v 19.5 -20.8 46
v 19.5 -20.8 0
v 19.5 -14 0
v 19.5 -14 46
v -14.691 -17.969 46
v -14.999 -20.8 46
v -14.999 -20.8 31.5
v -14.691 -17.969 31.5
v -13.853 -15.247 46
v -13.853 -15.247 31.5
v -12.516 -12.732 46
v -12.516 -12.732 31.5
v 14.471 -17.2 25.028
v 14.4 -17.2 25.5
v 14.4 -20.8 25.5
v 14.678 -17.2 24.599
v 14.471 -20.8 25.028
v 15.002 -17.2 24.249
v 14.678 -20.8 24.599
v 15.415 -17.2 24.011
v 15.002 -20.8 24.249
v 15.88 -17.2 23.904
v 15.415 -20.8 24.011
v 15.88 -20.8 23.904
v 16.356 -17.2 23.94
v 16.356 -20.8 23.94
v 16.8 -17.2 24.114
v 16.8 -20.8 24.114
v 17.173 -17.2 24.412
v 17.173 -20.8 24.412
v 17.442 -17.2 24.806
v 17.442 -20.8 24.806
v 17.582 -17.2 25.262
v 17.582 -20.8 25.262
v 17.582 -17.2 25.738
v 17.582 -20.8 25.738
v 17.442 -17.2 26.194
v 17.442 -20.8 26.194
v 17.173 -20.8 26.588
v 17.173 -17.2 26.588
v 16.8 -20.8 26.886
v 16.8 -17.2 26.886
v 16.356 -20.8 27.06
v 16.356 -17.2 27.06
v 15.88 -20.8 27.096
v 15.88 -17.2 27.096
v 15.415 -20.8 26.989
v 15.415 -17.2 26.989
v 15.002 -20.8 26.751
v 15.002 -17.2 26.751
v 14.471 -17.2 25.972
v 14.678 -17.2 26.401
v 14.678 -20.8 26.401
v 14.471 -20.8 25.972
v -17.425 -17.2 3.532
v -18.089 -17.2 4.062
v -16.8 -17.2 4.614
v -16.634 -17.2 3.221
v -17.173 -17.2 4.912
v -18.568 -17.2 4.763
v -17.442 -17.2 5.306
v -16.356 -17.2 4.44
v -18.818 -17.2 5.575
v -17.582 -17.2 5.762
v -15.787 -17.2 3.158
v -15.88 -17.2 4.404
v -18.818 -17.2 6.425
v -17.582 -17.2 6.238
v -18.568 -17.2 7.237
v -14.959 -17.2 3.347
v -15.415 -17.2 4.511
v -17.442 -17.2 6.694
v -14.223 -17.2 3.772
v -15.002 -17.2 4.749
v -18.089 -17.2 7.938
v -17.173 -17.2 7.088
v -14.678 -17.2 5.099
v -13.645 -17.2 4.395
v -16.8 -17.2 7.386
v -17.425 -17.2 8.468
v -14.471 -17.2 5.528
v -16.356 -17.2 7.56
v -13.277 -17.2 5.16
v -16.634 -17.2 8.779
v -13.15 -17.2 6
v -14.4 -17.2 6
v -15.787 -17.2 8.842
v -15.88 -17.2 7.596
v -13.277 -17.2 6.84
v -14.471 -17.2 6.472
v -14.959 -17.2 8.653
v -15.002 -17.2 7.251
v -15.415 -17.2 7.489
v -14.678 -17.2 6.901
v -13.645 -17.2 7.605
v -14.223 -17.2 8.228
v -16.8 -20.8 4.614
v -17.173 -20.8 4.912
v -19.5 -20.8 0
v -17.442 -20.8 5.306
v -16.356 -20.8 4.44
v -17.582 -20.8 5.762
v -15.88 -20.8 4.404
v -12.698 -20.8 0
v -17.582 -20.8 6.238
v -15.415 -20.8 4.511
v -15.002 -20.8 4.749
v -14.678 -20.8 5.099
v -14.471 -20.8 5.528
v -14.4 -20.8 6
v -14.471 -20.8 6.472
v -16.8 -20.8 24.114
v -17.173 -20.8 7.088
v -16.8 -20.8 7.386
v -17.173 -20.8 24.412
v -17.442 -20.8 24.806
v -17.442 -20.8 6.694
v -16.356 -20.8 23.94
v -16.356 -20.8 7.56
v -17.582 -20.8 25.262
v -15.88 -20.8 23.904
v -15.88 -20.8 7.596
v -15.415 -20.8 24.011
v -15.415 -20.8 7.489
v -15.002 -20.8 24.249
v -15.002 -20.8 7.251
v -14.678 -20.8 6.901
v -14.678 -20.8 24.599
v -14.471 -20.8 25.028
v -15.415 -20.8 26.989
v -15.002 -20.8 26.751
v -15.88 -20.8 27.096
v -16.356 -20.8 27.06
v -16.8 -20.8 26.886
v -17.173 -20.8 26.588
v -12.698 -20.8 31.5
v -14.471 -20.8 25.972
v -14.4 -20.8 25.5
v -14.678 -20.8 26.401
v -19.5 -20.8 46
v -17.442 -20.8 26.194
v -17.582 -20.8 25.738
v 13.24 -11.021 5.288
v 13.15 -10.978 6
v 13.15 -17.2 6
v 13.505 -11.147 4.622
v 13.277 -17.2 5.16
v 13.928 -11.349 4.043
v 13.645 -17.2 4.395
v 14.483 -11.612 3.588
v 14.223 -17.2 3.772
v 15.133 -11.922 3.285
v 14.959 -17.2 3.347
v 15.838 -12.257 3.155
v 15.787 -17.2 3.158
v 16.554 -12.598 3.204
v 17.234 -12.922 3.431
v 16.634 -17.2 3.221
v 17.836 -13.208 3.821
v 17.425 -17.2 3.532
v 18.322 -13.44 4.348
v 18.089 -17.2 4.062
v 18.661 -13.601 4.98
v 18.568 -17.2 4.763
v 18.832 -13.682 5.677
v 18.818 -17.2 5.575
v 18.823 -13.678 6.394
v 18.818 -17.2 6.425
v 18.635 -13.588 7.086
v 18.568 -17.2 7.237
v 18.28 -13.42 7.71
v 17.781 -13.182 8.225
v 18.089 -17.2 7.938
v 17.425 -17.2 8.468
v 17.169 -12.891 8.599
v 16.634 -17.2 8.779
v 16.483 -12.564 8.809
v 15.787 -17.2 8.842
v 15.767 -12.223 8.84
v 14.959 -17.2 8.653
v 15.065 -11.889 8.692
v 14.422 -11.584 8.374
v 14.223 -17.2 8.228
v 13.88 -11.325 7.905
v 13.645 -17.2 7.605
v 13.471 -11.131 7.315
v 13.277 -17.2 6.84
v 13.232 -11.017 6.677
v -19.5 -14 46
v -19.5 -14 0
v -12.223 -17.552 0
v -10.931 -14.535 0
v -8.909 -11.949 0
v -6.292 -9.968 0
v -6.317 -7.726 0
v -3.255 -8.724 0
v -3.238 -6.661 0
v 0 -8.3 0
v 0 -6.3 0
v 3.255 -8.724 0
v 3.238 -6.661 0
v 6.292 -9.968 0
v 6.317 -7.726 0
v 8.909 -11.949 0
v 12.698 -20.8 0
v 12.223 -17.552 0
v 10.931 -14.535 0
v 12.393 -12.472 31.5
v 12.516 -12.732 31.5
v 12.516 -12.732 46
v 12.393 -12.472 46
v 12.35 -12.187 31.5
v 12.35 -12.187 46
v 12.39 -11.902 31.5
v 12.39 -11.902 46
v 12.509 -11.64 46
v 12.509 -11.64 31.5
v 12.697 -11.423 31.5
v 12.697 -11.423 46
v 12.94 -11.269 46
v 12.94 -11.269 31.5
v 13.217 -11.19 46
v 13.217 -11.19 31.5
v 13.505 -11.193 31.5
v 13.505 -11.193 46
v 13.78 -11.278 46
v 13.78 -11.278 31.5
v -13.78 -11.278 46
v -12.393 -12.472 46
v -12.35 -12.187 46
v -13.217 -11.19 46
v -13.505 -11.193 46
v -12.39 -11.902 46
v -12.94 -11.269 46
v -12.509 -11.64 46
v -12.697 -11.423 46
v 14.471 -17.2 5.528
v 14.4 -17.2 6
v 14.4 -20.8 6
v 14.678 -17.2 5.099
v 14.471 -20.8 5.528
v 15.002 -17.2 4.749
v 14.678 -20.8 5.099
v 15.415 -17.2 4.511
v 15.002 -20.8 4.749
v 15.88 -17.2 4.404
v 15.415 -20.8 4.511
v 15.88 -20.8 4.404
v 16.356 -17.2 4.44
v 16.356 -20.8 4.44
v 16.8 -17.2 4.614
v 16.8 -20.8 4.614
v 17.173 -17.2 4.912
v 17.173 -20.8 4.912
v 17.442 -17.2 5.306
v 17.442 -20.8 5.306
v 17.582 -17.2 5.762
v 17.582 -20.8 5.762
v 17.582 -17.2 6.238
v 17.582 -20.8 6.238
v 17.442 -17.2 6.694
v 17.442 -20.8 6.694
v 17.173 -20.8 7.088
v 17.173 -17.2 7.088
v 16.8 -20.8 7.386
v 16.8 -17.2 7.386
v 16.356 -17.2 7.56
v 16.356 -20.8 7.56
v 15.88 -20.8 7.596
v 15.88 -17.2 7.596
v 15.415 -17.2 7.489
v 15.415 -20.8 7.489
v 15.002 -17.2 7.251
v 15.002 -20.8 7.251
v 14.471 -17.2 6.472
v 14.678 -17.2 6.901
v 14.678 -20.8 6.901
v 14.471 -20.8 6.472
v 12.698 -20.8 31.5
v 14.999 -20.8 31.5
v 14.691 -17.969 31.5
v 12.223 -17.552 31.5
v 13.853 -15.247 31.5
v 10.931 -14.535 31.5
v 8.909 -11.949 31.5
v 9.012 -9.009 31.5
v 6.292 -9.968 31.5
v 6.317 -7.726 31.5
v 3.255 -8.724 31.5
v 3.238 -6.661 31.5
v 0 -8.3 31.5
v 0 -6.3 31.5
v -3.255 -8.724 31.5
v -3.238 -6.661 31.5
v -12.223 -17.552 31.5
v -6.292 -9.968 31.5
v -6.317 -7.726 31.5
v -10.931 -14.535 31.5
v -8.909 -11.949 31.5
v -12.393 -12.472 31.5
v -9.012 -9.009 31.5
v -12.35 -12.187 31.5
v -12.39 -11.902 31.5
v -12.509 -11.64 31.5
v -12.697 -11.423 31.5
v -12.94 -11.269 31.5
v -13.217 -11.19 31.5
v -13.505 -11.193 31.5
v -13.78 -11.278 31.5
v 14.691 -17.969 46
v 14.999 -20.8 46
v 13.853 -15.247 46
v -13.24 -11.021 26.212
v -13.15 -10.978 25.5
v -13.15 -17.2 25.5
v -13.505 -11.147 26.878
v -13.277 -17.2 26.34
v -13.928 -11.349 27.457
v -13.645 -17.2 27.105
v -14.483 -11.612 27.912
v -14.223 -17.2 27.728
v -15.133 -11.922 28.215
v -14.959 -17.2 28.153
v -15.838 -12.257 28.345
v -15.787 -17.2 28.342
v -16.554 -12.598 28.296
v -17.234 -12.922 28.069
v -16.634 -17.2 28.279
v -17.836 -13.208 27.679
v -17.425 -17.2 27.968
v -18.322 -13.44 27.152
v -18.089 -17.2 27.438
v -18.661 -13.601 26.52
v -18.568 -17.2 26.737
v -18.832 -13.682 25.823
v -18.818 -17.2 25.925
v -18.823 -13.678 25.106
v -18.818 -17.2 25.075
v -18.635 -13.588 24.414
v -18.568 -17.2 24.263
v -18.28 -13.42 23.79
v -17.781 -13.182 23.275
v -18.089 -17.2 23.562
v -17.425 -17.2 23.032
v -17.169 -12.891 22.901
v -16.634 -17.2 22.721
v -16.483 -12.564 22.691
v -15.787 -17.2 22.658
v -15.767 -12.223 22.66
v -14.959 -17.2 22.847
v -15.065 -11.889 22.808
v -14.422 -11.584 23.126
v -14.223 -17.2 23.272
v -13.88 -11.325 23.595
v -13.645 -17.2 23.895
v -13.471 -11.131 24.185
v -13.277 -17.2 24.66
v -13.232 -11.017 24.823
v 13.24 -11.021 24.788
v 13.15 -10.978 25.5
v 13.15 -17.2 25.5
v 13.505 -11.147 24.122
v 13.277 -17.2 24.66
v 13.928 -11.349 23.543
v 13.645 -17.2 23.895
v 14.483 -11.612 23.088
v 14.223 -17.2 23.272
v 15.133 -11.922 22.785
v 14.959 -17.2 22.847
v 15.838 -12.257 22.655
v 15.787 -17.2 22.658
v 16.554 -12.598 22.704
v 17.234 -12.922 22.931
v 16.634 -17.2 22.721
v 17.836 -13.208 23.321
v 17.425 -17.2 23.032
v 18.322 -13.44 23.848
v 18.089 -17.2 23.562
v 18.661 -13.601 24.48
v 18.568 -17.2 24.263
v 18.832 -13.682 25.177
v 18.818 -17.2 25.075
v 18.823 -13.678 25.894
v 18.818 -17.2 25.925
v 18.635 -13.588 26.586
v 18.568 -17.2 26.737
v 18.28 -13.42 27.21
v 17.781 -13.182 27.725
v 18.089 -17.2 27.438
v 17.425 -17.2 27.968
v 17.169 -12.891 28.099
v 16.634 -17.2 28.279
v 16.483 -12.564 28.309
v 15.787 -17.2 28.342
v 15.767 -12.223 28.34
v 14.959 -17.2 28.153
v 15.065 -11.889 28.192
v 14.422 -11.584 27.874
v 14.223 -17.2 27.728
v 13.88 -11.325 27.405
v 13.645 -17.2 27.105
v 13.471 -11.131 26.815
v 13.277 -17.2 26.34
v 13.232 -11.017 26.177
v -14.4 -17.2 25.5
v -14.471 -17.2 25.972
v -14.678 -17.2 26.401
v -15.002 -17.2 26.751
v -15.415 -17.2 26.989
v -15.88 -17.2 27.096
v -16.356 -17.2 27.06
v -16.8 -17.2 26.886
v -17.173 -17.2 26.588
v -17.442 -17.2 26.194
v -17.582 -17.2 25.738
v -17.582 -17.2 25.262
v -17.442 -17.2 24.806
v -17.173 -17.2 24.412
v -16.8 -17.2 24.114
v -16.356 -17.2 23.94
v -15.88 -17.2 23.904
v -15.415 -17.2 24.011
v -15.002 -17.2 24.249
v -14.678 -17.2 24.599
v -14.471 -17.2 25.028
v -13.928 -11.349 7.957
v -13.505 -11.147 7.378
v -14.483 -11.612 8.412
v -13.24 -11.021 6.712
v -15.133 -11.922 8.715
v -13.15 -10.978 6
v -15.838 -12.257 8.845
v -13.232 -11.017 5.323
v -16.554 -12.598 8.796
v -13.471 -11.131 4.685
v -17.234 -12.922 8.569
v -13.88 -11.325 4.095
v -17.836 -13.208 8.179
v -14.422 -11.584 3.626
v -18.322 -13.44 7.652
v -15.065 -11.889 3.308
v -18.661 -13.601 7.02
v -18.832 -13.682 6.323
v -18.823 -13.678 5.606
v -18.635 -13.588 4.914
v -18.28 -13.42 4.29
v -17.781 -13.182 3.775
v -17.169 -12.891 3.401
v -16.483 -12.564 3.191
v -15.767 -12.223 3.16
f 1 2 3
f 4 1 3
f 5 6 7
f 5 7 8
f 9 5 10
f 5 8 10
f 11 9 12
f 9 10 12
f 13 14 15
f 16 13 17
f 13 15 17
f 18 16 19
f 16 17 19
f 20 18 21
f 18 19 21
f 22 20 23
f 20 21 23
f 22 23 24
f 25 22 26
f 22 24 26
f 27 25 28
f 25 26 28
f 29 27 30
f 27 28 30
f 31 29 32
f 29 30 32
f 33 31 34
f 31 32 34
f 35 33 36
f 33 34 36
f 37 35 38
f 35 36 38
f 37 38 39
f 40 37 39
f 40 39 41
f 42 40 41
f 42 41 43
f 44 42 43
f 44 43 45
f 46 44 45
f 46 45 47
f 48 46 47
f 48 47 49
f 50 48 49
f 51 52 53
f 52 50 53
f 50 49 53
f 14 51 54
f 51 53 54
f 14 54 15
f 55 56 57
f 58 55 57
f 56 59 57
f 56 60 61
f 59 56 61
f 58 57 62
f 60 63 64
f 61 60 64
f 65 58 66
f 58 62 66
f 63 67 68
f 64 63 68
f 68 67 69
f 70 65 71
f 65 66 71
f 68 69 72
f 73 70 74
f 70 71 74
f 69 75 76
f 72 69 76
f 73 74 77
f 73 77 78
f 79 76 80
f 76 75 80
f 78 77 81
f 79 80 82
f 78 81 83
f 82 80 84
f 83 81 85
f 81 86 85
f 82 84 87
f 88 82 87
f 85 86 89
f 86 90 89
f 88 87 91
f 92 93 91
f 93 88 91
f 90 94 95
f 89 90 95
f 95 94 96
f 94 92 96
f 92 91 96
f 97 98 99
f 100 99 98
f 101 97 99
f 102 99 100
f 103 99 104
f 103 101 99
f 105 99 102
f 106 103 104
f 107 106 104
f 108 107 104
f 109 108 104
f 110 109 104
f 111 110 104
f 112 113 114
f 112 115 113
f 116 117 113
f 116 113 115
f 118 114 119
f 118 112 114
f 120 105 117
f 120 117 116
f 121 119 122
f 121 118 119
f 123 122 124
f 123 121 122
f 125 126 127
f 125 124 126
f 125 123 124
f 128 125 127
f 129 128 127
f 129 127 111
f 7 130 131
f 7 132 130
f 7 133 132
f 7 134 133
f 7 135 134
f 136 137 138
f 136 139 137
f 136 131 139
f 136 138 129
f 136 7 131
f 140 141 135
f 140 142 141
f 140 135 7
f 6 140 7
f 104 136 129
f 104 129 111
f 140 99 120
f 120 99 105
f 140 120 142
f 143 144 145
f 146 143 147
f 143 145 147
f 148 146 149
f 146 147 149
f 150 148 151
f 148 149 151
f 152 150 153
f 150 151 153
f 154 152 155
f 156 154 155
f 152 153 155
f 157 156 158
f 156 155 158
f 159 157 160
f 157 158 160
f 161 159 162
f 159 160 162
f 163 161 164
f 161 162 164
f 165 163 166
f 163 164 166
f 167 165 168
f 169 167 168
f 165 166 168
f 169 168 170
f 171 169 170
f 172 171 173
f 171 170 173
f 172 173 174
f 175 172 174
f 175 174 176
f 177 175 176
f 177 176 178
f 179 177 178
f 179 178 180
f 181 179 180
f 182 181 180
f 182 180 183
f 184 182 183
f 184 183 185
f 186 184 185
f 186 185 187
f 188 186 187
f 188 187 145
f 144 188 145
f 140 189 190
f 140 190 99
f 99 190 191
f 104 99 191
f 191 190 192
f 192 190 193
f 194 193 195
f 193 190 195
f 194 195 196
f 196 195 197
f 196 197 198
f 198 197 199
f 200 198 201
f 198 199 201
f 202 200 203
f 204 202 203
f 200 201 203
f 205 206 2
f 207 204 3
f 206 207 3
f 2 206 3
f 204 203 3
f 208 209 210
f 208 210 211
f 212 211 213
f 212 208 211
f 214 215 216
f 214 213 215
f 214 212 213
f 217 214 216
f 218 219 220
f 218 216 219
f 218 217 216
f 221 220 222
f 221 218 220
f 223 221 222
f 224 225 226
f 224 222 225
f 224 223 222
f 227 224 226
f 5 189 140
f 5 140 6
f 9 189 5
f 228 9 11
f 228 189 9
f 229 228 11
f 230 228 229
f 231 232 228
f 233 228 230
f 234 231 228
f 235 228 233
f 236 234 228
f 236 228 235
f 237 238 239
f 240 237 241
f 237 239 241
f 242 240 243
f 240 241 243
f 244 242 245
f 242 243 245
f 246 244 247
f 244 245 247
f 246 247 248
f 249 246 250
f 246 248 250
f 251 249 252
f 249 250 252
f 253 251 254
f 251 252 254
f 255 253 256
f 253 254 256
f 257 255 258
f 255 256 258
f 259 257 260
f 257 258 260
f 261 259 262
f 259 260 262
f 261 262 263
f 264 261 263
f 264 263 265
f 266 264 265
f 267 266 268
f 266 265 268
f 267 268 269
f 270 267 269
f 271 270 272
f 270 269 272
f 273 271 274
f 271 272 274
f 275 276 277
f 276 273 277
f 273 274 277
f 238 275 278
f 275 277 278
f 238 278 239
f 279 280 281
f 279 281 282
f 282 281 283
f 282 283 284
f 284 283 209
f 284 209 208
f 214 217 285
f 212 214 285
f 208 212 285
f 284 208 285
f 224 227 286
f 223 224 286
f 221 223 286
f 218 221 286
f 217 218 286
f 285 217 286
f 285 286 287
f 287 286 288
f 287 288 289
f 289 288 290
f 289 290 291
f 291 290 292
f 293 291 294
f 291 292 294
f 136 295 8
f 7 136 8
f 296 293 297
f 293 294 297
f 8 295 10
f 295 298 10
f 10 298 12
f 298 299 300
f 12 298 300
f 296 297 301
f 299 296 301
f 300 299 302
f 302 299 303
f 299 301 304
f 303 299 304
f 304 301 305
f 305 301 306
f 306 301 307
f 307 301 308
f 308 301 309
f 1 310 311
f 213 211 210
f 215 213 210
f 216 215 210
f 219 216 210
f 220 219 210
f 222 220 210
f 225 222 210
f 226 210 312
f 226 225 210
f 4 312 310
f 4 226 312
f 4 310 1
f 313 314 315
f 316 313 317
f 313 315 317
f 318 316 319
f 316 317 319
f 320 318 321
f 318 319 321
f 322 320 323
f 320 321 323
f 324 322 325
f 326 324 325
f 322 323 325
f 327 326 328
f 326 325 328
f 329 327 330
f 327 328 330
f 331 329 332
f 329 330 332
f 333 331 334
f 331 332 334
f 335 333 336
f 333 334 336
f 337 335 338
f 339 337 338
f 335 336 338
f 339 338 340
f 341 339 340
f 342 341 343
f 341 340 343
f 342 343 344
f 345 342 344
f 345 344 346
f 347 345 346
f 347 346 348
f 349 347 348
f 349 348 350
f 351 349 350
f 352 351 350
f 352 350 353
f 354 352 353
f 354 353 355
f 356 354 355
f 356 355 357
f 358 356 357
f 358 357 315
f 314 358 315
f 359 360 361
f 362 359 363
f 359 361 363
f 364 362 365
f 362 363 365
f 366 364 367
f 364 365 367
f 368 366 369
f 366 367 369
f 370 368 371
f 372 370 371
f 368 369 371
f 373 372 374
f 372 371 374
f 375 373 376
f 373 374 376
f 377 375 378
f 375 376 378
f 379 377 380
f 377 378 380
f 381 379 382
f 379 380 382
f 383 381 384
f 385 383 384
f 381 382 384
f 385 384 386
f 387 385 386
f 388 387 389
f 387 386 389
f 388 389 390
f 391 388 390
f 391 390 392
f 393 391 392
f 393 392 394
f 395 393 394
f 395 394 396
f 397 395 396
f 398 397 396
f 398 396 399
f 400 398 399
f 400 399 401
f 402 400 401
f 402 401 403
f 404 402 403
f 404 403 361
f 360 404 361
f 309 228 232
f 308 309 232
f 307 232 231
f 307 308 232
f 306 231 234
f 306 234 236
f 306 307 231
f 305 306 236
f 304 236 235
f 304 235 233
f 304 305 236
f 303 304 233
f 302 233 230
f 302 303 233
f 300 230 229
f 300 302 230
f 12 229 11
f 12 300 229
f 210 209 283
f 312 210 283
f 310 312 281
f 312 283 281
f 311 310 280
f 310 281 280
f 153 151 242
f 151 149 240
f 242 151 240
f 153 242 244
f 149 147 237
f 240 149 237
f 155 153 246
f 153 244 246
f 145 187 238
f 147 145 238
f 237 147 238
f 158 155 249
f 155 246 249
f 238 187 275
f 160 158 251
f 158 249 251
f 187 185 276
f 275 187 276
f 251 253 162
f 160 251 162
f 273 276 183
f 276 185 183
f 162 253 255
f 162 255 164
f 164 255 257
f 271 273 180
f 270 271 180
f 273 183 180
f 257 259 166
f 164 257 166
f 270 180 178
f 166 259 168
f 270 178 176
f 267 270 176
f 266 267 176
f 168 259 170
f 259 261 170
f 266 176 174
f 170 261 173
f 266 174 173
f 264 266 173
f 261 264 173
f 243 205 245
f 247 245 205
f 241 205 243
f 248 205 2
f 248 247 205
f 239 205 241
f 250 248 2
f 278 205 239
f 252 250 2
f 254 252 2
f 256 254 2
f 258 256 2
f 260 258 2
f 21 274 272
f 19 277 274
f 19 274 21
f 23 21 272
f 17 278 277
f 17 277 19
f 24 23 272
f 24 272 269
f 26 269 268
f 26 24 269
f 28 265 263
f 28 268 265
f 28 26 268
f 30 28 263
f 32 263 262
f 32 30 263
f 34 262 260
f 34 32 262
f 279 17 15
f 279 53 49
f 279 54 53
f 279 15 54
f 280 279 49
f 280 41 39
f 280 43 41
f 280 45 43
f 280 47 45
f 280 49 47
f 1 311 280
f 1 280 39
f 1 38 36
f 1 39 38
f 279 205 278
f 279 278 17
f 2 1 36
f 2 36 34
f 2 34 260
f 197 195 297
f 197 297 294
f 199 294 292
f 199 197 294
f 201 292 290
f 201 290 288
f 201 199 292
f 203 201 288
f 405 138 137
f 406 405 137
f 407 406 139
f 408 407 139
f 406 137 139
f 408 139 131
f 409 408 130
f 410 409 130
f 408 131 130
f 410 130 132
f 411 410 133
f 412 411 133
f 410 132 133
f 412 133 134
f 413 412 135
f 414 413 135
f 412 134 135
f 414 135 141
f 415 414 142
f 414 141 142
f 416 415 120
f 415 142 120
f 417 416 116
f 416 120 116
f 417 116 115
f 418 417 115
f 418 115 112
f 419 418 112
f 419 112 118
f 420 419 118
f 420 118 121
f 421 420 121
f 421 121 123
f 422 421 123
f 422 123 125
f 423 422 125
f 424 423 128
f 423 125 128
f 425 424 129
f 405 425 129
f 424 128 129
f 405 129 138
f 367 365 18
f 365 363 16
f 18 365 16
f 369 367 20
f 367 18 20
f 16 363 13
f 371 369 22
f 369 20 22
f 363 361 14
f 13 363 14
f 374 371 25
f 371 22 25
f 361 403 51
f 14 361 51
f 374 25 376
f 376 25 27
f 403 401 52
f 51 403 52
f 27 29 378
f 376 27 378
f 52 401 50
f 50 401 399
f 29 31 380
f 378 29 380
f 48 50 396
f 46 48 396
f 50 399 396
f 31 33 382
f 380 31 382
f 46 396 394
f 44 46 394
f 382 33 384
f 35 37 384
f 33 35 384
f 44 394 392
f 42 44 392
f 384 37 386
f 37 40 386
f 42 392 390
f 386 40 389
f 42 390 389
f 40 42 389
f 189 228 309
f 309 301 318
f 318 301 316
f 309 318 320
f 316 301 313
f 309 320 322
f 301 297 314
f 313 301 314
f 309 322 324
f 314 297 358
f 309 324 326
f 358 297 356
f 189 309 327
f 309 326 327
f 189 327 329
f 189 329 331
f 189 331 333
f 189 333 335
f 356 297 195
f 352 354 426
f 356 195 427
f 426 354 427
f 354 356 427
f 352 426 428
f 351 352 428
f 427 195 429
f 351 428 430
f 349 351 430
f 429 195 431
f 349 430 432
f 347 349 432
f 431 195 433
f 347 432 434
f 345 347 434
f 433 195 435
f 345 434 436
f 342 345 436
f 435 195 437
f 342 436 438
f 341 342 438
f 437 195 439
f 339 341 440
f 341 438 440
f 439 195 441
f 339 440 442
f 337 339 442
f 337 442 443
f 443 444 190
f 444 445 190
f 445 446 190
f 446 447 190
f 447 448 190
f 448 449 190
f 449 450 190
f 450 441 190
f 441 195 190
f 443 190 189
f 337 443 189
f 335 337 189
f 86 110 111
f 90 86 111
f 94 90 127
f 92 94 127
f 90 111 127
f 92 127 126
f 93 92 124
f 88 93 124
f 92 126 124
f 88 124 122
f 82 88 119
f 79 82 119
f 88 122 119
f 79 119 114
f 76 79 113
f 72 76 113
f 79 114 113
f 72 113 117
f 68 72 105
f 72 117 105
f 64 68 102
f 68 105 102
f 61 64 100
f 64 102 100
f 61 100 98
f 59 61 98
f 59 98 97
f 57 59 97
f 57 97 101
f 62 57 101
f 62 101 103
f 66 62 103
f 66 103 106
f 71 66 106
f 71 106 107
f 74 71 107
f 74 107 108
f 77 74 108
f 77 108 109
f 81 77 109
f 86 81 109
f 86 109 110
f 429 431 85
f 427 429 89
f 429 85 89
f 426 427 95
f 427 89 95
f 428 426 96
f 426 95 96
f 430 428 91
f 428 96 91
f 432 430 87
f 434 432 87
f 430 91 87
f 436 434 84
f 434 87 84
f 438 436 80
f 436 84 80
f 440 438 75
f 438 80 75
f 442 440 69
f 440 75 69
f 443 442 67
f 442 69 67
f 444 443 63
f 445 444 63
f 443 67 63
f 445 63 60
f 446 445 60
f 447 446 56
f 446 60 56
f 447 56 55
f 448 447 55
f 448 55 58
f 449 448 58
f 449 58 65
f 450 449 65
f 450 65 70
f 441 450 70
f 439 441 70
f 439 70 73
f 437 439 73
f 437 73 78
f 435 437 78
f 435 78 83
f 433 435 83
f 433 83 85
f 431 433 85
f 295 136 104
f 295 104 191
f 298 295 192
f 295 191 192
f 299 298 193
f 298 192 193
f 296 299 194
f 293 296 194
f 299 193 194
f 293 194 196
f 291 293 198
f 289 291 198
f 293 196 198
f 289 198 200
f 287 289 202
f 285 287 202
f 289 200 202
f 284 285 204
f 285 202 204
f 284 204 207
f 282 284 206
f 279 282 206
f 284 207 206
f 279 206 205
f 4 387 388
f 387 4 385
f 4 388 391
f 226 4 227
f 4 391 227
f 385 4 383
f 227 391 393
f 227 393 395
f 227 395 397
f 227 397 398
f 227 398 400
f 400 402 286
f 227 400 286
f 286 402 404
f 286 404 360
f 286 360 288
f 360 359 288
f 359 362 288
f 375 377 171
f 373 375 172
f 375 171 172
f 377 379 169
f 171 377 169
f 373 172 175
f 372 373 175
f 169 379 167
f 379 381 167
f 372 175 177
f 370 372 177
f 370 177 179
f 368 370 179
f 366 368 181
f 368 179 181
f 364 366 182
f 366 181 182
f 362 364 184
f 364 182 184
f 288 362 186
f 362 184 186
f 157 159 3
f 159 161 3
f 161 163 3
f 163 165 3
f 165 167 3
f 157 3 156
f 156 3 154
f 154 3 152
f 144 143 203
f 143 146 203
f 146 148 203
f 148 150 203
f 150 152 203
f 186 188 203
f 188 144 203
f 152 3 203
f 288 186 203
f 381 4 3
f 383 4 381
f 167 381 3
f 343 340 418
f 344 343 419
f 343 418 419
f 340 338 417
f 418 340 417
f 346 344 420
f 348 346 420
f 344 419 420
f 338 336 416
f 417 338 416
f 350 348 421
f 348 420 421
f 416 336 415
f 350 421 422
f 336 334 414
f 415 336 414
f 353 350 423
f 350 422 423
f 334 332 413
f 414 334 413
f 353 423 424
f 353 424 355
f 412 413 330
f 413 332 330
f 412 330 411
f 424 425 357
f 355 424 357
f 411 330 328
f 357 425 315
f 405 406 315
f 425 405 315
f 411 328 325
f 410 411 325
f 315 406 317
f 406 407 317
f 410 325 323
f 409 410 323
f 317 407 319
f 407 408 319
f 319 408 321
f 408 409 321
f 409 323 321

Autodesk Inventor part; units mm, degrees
ref_plane "YZ Plane" through (0, 0, 0) normal (1, 0, 0) x (0, 1, 0)
ref_plane "XZ Plane" through (0, 0, 0) normal (0, 1, 0) x (-1, 0, 0)
ref_plane "XY Plane" through (0, 0, 0) normal (0, 0, 1) x (1, 0, 0)
sketch "スケッチ1" plane through (0, 0, 0) normal (0, 0, 1) x (1, 0, 0)
  line L0 (-12.5, 3.2) -> (-11.75, 0)
  line L1 (-11.75, 0) -> (11.75, 0)
  line L2 (11.75, 0) -> (12.5, 3.2)
  line L3 (12.5, 3.2) -> (19.5, 3.2)
  line L4 (19.5, 3.2) -> (19.5, -4)
  line L5 (19.5, -4) -> (-19.5, -4)
  line L6 (-19.5, -4) -> (-19.5, 3.2)
  line L7 (-19.5, 3.2) -> (-12.5, 3.2)
  circle A0 centre (0, -21) radius 12.7 construction
  line L8 (-5.5, -4) -> (5.5, -4) construction
  line L9 (5.5, -4) -> (5.5, -7.5) construction
  line L10 (5.5, -7.5) -> (-5.5, -7.5) construction
  line L11 (-5.5, -7.5) -> (-5.5, -4) construction
  circle A1 centre (0, -21) radius 14.7 construction
  line L12 (-19.5, -21) -> (19.5, -21) construction
  line L13 (-18.75, -24.8) -> (-13.25, -24.8) construction
  line L14 (-13.25, -24.8) -> (-13.25, -27.8) construction
  line L15 (-13.25, -27.8) -> (-18.75, -27.8) construction
  line L16 (-18.75, -27.8) -> (-18.75, -24.8) construction
  line L17 (-16, -27.8) -> (-16, -14.8) construction
  line L18 (-18.75, -14.8) -> (-13.25, -14.8) construction
  line L19 (-13.25, -14.8) -> (-13.25, -17.2) construction
  line L20 (-13.25, -17.2) -> (-18.75, -17.2) construction
  line L21 (-18.75, -17.2) -> (-18.75, -14.8) construction
  line L22 (-14.5, -14.8) -> (-14.5, -27.8) construction
  line L23 (-17.5, -14.8) -> (-17.5, -27.8) construction
  point P0 (0, 0)
  point P1 (0, 0)
  point P2 (0, -4)
  dimension "d0" = 4
  dimension "d1" = 3.2
  dimension "d2" = 23.5
  dimension "d3" = 25
  dimension "d4" = 39
  dimension "d5" = 25.4
  dimension "d6" = 3.5
  dimension "d7" = 21
  dimension "d8" = 11
  dimension "d9" = 2
  dimension "d11" = 5.5
  dimension "d12" = 3
  dimension "d13" = 5.5
  dimension "d14" = 2.4
  dimension "d15" = 10
  dimension "d16" = 1.5
  dimension "d17" = 1.5
  dimension "d18" = 3.8
  dimension "d19" = 16
extrude "押し出し1" add sketch "スケッチ1" along normal blind 46
sketch "スケッチ2" plane through (0, 0, 0) normal (0, 0, -1) x (-1, 0, 0)
  line L0 (19.5, -4) -> (-19.5, -4) projected
  circle A0 centre (0, -21) radius 12.7 projected
  line L1 (19.5, -21) -> (-19.5, -21) projected
  line L2 (-19.5, -21) -> (-19.5, -4)
  line L3 (19.5, -4) -> (19.5, -21)
  point P0 (0, 0)
  point P1 (-12.7, -21)
  point P2 (12.7, -21)
extrude "押し出し2" add sketch "スケッチ2" against normal blind 31.5 contours L3 L1 A0 L2 L0
sketch "スケッチ3" plane through (0, 0, 31.5) normal (0, 0, 1) x (1, 0, 0)
  line L0 (-19.5, -4) -> (19.5, -4) projected
  line L1 (-19.5, -4) -> (-19.5, -21) projected
  line L2 (-19.5, -21) -> (-12.7, -21) projected
  arc A0 (12.7, -21) -> (-12.7, -21) centre (0, -21) ccw projected
  line L3 (12.7, -21) -> (19.5, -21) projected
  line L4 (19.5, -21) -> (19.5, -4) projected
  circle A1 centre (0, -21) radius 15
  point P0 (0, 0)
  point P1 (-15, -21)
  point P2 (15, -21)
  dimension "d24" = 30
extrude "押し出し3" add sketch "スケッチ3" along normal up to surface (14.5 mm away) contours L0 L4 L3 A1 L2 L1
sketch "スケッチ7" plane through (-19.5, -21, 0) normal (0, -1, 0) x (1, 0, 0)
  line L0 (6.8, 0) -> (0, 0) construction
  line L1 (6.8, 0) -> (6.8, 31.5) construction
  line L2 (4.5, 31.5) -> (6.8, 31.5) construction
  line L3 (4.5, 31.5) -> (4.5, 46) construction
  line L4 (4.5, 46) -> (0, 46) construction
  line L5 (0, 0) -> (0, 46) construction
  line L6 (3.5, 0) -> (3.5, 31.5) construction
  circle A0 centre (3.5, 6) radius 2.85
  circle A1 centre (3.5, 25.5) radius 2.85
  point P0 (19.5, 0)
  dimension "d34" = 16
  dimension "d35" = 5.7
  dimension "d36" = 6
  dimension "d37" = 6
extrude "押し出し6" cut sketch "スケッチ7" against normal through all
sketch "スケッチ9" plane through (-19.5, -21, 0) normal (0, -1, 0) x (1, 0, 0)
  circle A0 centre (3.5, 25.5) radius 2.85 projected
  circle A1 centre (3.5, 6) radius 2.85 projected
  circle A2 centre (3.5, 25.5) radius 1.6
  circle A3 centre (3.5, 6) radius 1.6
  point P0 (19.5, 0)
  dimension "d43" = 3.2
extrude "押し出し8" add sketch "スケッチ9" against normal blind 3.8
mirror "ミラー2" about plane through (0, 0, 0) normal (1, 0, 0) of "押し出し6", "押し出し8"
sketch "スケッチ10" plane through (0, 0, 0) normal (0, 0, -1) x (-1, 0, 0)
  circle A0 centre (0, -21) radius 14.7 projected
  line L0 (-19.5, -21) -> (-12.7, -21) projected
  line L1 (12.7, -21) -> (19.5, -21) projected
  line L2 (-19.5, 3.2) -> (-19.5, -21) projected
  line L3 (19.5, 3.2) -> (19.5, -21) projected
  line L4 (-19.5, -14) -> (-6.3166, -7.7263)
  line L5 (6.3166, -7.7263) -> (19.5, -14)
  arc A1 (12.7, -21) -> (-12.7, -21) centre (0, -21) ccw projected
  line L6 (-19.5, 3.2) -> (-12.5, 3.2) projected
  line L7 (-12.5, 3.2) -> (-11.75, 0) projected
  line L8 (-11.75, 0) -> (11.75, 0) projected
  line L9 (11.75, 0) -> (12.5, 3.2) projected
  line L10 (12.5, 3.2) -> (19.5, 3.2) projected
  point P0 (0, 0)
  dimension "d46" = 7
extrude "押し出し9" cut sketch "スケッチ10" against normal through all contours A0 L4 L2 L6 L7 L8 L9 L10 L3 L5
sketch "スケッチ11" plane through (-19.5, -21, 0) normal (0, -1, 0) x (1, 0, 0)
  line L0 (-33.1912, 72.2952) -> (57.3732, 72.2952)
  line L1 (57.3732, 72.2952) -> (57.3732, -15.6553)
  line L2 (57.3732, -15.6553) -> (-33.1912, -15.6553)
  line L3 (-33.1912, -15.6553) -> (-33.1912, 72.2952)
  point P0 (19.5, 0)
extrude "押し出し10" cut sketch "スケッチ11" against normal blind 0.2
fillet "フィレット1" radius 1 2 edges at (-9.012, -9.009, 38.75) (9.012, -9.009, 38.75)
equation "\"d17\" = d16"
equation "\"d34\" = d19"
equation "\"d44\" = d18"
properties part number "led_holder_02"
